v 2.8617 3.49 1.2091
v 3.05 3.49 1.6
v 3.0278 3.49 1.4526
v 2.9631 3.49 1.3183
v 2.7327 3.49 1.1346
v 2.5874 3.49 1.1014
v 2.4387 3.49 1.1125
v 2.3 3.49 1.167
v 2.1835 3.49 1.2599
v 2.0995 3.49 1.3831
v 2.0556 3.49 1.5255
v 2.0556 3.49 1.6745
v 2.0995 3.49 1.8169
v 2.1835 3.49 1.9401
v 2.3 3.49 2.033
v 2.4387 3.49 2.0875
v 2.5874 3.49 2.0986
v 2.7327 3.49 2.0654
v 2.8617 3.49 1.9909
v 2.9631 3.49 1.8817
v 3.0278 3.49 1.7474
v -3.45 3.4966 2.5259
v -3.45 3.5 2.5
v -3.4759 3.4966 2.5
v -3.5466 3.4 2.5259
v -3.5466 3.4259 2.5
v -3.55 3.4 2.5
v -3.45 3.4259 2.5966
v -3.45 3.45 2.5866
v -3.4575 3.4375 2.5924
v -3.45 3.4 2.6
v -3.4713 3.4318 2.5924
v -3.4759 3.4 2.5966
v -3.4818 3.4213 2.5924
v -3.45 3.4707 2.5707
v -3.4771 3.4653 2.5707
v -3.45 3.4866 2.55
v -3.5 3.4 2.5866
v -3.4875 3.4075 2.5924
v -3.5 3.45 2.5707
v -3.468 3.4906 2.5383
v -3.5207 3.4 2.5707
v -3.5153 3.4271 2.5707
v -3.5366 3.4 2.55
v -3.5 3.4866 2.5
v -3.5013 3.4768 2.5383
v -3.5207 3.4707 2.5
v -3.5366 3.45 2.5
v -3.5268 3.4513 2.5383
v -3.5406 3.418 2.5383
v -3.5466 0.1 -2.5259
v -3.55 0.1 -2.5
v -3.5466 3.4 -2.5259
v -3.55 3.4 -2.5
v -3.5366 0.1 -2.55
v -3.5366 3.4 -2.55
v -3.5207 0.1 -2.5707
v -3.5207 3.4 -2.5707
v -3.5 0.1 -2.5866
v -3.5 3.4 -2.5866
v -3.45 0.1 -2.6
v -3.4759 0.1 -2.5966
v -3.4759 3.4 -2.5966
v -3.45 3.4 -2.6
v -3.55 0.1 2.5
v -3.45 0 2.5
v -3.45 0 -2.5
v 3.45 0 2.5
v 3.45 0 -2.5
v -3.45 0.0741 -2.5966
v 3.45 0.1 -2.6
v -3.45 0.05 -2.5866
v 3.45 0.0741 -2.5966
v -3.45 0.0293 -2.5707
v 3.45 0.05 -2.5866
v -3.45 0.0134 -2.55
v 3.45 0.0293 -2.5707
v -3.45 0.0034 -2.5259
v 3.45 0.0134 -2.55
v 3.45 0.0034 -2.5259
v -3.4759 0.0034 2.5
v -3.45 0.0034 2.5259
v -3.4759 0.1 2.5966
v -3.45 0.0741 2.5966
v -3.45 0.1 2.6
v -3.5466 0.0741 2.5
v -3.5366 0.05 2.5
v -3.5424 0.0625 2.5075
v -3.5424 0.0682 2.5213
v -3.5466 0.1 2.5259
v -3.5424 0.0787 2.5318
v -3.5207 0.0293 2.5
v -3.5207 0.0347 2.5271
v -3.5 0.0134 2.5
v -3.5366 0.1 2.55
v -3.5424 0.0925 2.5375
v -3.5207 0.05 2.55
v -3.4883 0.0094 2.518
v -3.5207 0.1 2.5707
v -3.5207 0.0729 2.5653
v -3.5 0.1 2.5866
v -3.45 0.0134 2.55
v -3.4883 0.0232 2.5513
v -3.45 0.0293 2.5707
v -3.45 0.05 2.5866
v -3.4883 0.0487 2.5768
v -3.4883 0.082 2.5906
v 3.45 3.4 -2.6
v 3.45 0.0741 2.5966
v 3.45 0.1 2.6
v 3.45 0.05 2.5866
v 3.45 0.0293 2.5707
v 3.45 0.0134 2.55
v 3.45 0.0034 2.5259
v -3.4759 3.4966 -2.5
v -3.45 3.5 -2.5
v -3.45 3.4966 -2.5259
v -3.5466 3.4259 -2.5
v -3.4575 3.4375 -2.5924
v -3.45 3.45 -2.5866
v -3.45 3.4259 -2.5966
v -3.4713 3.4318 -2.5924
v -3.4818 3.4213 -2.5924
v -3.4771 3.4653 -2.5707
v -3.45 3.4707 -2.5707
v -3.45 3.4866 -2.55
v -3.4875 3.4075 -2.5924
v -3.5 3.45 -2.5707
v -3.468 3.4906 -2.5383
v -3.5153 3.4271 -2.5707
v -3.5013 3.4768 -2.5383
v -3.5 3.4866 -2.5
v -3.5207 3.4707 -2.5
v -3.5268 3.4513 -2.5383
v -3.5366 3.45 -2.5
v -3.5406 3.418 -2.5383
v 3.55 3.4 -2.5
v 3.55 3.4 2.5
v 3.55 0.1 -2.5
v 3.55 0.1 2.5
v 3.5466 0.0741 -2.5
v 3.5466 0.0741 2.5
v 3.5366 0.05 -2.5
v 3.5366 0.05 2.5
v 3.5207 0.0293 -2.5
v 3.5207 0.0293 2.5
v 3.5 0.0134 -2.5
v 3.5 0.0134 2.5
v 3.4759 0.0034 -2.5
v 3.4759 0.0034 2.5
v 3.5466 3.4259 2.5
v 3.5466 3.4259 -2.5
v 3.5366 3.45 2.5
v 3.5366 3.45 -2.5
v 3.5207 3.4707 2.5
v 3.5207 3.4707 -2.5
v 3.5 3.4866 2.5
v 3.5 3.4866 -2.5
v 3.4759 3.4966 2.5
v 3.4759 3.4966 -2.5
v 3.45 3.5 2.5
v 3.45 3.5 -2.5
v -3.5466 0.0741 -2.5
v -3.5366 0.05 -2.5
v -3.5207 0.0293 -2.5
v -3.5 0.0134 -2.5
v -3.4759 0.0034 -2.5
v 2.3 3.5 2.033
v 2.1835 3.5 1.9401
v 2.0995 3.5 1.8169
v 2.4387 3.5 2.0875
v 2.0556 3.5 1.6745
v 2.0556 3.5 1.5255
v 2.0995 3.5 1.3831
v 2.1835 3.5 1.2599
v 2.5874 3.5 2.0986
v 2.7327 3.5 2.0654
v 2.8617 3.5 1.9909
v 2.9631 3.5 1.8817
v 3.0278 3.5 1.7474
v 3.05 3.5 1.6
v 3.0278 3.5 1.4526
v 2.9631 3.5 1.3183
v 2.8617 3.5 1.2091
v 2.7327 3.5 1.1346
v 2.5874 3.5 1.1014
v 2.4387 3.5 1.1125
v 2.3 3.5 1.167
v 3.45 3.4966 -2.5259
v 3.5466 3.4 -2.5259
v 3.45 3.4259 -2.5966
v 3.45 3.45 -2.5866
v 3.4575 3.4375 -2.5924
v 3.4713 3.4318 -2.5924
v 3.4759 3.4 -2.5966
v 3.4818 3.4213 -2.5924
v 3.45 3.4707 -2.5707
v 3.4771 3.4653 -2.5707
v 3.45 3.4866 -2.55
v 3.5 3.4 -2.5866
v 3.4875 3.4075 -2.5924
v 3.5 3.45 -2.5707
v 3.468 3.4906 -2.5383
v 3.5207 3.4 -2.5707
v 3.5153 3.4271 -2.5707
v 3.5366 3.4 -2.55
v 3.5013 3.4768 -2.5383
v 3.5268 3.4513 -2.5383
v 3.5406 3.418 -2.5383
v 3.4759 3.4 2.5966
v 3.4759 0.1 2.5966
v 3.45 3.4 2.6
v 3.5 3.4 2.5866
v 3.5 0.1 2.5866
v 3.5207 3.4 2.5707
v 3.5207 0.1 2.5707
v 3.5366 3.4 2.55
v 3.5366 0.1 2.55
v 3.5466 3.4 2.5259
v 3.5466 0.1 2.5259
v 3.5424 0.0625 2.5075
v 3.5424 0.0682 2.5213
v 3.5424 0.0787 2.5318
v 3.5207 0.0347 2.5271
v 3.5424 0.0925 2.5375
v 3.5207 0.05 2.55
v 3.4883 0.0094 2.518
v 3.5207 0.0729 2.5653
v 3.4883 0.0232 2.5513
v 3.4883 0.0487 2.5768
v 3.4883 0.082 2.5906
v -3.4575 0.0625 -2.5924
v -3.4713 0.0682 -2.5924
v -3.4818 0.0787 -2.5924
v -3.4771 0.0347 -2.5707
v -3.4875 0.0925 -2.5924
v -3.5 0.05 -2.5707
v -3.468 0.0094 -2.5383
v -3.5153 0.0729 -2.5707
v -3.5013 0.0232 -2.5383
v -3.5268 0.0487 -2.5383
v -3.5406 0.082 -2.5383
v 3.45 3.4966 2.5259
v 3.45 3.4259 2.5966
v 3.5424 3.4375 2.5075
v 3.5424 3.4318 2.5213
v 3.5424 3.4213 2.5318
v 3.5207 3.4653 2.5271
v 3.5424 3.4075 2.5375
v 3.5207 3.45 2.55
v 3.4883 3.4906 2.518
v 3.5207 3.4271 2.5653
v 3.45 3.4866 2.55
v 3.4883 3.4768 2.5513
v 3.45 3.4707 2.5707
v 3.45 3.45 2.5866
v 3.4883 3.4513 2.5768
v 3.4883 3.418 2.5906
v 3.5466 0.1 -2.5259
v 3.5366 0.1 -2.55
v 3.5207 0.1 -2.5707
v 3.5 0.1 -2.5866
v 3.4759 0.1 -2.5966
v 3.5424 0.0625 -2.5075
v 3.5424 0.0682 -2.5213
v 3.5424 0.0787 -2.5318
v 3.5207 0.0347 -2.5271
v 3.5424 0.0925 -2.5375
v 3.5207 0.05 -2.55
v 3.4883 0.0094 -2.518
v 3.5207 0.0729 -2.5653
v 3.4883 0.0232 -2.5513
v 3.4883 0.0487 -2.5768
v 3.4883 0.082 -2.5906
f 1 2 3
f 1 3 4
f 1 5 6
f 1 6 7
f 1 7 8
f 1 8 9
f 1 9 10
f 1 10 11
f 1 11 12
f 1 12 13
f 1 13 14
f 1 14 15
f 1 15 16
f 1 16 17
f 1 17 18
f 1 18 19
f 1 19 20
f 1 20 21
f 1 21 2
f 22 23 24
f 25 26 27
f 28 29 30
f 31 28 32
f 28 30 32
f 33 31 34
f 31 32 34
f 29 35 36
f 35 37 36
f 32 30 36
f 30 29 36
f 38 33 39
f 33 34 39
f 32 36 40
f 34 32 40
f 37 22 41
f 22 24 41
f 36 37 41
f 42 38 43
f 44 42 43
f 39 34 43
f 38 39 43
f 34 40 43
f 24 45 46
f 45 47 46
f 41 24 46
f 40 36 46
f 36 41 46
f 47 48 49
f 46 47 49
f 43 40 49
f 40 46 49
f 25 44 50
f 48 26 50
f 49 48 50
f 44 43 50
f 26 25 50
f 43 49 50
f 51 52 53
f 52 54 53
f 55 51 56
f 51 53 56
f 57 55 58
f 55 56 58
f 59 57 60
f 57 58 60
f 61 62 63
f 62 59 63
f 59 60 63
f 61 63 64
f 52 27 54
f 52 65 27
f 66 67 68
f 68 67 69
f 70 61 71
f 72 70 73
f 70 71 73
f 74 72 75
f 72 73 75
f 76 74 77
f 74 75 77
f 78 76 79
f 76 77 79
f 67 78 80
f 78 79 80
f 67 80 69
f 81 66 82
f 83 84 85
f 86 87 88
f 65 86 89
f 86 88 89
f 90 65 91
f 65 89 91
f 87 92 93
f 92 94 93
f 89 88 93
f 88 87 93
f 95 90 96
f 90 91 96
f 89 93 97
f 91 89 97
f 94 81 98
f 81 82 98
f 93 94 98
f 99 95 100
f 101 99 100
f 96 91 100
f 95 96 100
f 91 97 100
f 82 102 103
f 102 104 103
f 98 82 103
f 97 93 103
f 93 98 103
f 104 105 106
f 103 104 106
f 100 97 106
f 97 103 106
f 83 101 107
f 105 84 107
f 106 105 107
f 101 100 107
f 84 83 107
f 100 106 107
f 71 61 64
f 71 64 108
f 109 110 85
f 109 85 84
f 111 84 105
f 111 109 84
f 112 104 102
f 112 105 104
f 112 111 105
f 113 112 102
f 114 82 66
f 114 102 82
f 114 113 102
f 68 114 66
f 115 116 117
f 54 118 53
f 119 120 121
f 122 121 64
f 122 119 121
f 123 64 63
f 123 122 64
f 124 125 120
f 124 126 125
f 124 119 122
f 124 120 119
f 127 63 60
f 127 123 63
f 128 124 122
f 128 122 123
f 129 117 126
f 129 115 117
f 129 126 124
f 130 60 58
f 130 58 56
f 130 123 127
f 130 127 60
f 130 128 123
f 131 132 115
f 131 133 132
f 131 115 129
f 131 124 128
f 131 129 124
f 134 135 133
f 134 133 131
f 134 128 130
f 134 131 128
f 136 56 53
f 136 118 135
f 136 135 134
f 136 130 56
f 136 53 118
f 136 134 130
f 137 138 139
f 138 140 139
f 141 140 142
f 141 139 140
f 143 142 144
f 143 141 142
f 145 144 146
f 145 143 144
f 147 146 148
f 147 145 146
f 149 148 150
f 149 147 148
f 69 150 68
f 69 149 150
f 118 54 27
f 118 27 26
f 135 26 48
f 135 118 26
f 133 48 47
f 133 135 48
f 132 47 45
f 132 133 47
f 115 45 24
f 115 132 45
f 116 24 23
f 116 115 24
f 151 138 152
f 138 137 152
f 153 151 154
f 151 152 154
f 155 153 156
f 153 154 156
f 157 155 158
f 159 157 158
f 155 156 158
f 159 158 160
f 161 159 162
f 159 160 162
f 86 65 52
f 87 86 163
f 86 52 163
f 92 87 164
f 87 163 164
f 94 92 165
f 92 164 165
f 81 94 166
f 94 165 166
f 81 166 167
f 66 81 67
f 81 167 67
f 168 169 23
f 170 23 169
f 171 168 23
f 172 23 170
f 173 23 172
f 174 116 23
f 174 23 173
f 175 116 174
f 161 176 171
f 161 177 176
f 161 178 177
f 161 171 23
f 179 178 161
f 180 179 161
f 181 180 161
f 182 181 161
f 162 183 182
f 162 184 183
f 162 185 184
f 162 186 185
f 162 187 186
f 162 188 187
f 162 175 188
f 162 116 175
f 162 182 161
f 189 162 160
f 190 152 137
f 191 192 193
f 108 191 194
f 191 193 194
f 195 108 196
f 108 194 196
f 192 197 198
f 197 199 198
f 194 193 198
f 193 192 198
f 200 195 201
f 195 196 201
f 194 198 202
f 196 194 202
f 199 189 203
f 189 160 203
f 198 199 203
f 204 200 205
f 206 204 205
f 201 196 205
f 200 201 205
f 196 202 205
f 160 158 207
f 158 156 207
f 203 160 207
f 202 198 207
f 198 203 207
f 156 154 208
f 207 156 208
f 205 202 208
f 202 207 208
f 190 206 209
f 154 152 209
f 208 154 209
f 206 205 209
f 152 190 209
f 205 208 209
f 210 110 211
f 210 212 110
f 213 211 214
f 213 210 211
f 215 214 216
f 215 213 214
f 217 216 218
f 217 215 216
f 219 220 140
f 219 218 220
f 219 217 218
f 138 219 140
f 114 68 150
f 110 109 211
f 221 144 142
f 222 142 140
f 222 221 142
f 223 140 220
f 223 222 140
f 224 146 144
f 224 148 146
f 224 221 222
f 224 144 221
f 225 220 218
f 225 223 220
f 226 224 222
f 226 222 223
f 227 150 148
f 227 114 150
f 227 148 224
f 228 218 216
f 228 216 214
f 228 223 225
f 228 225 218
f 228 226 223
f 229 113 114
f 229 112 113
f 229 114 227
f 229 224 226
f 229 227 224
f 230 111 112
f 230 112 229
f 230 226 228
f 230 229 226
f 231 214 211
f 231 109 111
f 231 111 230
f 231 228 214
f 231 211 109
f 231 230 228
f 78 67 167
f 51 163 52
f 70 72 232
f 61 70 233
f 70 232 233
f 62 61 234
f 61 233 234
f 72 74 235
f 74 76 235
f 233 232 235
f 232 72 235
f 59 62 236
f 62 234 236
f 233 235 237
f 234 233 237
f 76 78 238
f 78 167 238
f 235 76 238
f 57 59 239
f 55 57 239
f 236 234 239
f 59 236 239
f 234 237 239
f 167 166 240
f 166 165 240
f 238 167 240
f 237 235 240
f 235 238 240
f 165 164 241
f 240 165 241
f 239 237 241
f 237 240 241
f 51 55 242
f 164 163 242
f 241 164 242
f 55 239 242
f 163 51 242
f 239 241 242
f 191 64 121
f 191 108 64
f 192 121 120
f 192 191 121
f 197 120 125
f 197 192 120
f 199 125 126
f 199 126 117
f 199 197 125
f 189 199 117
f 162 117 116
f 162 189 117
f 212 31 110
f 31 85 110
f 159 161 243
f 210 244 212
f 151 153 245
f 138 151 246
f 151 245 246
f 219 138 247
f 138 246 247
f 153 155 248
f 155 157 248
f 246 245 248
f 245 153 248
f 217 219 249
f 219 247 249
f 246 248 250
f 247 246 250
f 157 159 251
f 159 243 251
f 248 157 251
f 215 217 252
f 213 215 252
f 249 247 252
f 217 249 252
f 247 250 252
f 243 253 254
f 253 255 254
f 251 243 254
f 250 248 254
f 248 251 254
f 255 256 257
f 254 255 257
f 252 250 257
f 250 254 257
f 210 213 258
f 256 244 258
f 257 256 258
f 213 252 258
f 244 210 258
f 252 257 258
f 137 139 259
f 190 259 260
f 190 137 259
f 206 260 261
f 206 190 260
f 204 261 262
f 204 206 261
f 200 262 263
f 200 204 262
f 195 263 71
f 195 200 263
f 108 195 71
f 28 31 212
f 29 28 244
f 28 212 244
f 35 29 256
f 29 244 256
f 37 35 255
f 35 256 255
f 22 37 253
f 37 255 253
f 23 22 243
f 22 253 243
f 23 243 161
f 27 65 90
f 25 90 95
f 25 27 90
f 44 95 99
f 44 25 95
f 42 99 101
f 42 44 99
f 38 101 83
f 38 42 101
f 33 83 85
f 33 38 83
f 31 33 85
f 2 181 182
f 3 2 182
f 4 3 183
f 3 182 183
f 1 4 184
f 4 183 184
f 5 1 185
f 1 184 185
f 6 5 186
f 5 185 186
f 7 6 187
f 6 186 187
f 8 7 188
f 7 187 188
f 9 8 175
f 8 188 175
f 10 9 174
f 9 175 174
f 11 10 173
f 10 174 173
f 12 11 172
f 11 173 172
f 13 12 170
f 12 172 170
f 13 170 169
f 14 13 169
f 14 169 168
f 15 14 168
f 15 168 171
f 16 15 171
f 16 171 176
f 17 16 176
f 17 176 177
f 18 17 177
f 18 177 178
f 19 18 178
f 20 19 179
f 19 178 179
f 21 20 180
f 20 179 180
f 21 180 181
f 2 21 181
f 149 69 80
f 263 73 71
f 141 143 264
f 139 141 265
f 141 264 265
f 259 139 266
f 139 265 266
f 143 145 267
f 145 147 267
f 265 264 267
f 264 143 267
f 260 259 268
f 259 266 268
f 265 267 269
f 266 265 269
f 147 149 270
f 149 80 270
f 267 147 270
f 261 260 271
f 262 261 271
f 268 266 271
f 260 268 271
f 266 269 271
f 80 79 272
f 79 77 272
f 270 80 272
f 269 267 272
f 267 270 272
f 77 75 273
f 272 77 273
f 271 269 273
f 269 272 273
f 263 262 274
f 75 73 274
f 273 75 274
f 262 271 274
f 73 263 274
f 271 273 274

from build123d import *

# Parameters (mm, degrees)
SKETCH1_W           = 7.1
SKETCH1_H           = 5.2
BOSS_EXTRUDE1_DEPTH = 3.5
FILLET1_R           = 0.1
SKETCH2_R           = 0.5
CUT_EXTRUDE1_DEPTH  = 0.01


with BuildPart() as part:
    # Sketch1 → Boss-Extrude1 (new body)
    with BuildSketch(Plane(origin=(0, 0, 0), x_dir=(1, 0, 0), z_dir=(0, 1, 0))):
        Rectangle(SKETCH1_W, SKETCH1_H)
    extrude(amount=BOSS_EXTRUDE1_DEPTH)

    # Fillet1
    fillet1_edges = [part.edges().sort_by_distance(p)[0] for p in [
        (-3.55, 3.5, 0),
        (0, 3.5, 2.6),
        (3.55, 3.5, 0),
        (0, 0, 2.6),
        (-3.55, 0, 0),
        (0, 0, -2.6),
        (3.55, 0, 0),
        (0, 3.5, -2.6),
        (3.55, 1.75, 2.6),
        (-3.55, 1.75, 2.6),
        (-3.55, 1.75, -2.6),
        (3.55, 1.75, -2.6),
    ]]
    fillet(fillet1_edges, radius=FILLET1_R)

    # Sketch2 → Cut-Extrude1 (cut)
    with BuildSketch(Plane(origin=(0, 3.5, 0), x_dir=(1, 0, 0), z_dir=(0, 1, 0))):
        with Locations((2.55, -1.6)):
            Circle(SKETCH2_R)
    extrude(amount=-CUT_EXTRUDE1_DEPTH, mode=Mode.SUBTRACT)


solid = part.part
